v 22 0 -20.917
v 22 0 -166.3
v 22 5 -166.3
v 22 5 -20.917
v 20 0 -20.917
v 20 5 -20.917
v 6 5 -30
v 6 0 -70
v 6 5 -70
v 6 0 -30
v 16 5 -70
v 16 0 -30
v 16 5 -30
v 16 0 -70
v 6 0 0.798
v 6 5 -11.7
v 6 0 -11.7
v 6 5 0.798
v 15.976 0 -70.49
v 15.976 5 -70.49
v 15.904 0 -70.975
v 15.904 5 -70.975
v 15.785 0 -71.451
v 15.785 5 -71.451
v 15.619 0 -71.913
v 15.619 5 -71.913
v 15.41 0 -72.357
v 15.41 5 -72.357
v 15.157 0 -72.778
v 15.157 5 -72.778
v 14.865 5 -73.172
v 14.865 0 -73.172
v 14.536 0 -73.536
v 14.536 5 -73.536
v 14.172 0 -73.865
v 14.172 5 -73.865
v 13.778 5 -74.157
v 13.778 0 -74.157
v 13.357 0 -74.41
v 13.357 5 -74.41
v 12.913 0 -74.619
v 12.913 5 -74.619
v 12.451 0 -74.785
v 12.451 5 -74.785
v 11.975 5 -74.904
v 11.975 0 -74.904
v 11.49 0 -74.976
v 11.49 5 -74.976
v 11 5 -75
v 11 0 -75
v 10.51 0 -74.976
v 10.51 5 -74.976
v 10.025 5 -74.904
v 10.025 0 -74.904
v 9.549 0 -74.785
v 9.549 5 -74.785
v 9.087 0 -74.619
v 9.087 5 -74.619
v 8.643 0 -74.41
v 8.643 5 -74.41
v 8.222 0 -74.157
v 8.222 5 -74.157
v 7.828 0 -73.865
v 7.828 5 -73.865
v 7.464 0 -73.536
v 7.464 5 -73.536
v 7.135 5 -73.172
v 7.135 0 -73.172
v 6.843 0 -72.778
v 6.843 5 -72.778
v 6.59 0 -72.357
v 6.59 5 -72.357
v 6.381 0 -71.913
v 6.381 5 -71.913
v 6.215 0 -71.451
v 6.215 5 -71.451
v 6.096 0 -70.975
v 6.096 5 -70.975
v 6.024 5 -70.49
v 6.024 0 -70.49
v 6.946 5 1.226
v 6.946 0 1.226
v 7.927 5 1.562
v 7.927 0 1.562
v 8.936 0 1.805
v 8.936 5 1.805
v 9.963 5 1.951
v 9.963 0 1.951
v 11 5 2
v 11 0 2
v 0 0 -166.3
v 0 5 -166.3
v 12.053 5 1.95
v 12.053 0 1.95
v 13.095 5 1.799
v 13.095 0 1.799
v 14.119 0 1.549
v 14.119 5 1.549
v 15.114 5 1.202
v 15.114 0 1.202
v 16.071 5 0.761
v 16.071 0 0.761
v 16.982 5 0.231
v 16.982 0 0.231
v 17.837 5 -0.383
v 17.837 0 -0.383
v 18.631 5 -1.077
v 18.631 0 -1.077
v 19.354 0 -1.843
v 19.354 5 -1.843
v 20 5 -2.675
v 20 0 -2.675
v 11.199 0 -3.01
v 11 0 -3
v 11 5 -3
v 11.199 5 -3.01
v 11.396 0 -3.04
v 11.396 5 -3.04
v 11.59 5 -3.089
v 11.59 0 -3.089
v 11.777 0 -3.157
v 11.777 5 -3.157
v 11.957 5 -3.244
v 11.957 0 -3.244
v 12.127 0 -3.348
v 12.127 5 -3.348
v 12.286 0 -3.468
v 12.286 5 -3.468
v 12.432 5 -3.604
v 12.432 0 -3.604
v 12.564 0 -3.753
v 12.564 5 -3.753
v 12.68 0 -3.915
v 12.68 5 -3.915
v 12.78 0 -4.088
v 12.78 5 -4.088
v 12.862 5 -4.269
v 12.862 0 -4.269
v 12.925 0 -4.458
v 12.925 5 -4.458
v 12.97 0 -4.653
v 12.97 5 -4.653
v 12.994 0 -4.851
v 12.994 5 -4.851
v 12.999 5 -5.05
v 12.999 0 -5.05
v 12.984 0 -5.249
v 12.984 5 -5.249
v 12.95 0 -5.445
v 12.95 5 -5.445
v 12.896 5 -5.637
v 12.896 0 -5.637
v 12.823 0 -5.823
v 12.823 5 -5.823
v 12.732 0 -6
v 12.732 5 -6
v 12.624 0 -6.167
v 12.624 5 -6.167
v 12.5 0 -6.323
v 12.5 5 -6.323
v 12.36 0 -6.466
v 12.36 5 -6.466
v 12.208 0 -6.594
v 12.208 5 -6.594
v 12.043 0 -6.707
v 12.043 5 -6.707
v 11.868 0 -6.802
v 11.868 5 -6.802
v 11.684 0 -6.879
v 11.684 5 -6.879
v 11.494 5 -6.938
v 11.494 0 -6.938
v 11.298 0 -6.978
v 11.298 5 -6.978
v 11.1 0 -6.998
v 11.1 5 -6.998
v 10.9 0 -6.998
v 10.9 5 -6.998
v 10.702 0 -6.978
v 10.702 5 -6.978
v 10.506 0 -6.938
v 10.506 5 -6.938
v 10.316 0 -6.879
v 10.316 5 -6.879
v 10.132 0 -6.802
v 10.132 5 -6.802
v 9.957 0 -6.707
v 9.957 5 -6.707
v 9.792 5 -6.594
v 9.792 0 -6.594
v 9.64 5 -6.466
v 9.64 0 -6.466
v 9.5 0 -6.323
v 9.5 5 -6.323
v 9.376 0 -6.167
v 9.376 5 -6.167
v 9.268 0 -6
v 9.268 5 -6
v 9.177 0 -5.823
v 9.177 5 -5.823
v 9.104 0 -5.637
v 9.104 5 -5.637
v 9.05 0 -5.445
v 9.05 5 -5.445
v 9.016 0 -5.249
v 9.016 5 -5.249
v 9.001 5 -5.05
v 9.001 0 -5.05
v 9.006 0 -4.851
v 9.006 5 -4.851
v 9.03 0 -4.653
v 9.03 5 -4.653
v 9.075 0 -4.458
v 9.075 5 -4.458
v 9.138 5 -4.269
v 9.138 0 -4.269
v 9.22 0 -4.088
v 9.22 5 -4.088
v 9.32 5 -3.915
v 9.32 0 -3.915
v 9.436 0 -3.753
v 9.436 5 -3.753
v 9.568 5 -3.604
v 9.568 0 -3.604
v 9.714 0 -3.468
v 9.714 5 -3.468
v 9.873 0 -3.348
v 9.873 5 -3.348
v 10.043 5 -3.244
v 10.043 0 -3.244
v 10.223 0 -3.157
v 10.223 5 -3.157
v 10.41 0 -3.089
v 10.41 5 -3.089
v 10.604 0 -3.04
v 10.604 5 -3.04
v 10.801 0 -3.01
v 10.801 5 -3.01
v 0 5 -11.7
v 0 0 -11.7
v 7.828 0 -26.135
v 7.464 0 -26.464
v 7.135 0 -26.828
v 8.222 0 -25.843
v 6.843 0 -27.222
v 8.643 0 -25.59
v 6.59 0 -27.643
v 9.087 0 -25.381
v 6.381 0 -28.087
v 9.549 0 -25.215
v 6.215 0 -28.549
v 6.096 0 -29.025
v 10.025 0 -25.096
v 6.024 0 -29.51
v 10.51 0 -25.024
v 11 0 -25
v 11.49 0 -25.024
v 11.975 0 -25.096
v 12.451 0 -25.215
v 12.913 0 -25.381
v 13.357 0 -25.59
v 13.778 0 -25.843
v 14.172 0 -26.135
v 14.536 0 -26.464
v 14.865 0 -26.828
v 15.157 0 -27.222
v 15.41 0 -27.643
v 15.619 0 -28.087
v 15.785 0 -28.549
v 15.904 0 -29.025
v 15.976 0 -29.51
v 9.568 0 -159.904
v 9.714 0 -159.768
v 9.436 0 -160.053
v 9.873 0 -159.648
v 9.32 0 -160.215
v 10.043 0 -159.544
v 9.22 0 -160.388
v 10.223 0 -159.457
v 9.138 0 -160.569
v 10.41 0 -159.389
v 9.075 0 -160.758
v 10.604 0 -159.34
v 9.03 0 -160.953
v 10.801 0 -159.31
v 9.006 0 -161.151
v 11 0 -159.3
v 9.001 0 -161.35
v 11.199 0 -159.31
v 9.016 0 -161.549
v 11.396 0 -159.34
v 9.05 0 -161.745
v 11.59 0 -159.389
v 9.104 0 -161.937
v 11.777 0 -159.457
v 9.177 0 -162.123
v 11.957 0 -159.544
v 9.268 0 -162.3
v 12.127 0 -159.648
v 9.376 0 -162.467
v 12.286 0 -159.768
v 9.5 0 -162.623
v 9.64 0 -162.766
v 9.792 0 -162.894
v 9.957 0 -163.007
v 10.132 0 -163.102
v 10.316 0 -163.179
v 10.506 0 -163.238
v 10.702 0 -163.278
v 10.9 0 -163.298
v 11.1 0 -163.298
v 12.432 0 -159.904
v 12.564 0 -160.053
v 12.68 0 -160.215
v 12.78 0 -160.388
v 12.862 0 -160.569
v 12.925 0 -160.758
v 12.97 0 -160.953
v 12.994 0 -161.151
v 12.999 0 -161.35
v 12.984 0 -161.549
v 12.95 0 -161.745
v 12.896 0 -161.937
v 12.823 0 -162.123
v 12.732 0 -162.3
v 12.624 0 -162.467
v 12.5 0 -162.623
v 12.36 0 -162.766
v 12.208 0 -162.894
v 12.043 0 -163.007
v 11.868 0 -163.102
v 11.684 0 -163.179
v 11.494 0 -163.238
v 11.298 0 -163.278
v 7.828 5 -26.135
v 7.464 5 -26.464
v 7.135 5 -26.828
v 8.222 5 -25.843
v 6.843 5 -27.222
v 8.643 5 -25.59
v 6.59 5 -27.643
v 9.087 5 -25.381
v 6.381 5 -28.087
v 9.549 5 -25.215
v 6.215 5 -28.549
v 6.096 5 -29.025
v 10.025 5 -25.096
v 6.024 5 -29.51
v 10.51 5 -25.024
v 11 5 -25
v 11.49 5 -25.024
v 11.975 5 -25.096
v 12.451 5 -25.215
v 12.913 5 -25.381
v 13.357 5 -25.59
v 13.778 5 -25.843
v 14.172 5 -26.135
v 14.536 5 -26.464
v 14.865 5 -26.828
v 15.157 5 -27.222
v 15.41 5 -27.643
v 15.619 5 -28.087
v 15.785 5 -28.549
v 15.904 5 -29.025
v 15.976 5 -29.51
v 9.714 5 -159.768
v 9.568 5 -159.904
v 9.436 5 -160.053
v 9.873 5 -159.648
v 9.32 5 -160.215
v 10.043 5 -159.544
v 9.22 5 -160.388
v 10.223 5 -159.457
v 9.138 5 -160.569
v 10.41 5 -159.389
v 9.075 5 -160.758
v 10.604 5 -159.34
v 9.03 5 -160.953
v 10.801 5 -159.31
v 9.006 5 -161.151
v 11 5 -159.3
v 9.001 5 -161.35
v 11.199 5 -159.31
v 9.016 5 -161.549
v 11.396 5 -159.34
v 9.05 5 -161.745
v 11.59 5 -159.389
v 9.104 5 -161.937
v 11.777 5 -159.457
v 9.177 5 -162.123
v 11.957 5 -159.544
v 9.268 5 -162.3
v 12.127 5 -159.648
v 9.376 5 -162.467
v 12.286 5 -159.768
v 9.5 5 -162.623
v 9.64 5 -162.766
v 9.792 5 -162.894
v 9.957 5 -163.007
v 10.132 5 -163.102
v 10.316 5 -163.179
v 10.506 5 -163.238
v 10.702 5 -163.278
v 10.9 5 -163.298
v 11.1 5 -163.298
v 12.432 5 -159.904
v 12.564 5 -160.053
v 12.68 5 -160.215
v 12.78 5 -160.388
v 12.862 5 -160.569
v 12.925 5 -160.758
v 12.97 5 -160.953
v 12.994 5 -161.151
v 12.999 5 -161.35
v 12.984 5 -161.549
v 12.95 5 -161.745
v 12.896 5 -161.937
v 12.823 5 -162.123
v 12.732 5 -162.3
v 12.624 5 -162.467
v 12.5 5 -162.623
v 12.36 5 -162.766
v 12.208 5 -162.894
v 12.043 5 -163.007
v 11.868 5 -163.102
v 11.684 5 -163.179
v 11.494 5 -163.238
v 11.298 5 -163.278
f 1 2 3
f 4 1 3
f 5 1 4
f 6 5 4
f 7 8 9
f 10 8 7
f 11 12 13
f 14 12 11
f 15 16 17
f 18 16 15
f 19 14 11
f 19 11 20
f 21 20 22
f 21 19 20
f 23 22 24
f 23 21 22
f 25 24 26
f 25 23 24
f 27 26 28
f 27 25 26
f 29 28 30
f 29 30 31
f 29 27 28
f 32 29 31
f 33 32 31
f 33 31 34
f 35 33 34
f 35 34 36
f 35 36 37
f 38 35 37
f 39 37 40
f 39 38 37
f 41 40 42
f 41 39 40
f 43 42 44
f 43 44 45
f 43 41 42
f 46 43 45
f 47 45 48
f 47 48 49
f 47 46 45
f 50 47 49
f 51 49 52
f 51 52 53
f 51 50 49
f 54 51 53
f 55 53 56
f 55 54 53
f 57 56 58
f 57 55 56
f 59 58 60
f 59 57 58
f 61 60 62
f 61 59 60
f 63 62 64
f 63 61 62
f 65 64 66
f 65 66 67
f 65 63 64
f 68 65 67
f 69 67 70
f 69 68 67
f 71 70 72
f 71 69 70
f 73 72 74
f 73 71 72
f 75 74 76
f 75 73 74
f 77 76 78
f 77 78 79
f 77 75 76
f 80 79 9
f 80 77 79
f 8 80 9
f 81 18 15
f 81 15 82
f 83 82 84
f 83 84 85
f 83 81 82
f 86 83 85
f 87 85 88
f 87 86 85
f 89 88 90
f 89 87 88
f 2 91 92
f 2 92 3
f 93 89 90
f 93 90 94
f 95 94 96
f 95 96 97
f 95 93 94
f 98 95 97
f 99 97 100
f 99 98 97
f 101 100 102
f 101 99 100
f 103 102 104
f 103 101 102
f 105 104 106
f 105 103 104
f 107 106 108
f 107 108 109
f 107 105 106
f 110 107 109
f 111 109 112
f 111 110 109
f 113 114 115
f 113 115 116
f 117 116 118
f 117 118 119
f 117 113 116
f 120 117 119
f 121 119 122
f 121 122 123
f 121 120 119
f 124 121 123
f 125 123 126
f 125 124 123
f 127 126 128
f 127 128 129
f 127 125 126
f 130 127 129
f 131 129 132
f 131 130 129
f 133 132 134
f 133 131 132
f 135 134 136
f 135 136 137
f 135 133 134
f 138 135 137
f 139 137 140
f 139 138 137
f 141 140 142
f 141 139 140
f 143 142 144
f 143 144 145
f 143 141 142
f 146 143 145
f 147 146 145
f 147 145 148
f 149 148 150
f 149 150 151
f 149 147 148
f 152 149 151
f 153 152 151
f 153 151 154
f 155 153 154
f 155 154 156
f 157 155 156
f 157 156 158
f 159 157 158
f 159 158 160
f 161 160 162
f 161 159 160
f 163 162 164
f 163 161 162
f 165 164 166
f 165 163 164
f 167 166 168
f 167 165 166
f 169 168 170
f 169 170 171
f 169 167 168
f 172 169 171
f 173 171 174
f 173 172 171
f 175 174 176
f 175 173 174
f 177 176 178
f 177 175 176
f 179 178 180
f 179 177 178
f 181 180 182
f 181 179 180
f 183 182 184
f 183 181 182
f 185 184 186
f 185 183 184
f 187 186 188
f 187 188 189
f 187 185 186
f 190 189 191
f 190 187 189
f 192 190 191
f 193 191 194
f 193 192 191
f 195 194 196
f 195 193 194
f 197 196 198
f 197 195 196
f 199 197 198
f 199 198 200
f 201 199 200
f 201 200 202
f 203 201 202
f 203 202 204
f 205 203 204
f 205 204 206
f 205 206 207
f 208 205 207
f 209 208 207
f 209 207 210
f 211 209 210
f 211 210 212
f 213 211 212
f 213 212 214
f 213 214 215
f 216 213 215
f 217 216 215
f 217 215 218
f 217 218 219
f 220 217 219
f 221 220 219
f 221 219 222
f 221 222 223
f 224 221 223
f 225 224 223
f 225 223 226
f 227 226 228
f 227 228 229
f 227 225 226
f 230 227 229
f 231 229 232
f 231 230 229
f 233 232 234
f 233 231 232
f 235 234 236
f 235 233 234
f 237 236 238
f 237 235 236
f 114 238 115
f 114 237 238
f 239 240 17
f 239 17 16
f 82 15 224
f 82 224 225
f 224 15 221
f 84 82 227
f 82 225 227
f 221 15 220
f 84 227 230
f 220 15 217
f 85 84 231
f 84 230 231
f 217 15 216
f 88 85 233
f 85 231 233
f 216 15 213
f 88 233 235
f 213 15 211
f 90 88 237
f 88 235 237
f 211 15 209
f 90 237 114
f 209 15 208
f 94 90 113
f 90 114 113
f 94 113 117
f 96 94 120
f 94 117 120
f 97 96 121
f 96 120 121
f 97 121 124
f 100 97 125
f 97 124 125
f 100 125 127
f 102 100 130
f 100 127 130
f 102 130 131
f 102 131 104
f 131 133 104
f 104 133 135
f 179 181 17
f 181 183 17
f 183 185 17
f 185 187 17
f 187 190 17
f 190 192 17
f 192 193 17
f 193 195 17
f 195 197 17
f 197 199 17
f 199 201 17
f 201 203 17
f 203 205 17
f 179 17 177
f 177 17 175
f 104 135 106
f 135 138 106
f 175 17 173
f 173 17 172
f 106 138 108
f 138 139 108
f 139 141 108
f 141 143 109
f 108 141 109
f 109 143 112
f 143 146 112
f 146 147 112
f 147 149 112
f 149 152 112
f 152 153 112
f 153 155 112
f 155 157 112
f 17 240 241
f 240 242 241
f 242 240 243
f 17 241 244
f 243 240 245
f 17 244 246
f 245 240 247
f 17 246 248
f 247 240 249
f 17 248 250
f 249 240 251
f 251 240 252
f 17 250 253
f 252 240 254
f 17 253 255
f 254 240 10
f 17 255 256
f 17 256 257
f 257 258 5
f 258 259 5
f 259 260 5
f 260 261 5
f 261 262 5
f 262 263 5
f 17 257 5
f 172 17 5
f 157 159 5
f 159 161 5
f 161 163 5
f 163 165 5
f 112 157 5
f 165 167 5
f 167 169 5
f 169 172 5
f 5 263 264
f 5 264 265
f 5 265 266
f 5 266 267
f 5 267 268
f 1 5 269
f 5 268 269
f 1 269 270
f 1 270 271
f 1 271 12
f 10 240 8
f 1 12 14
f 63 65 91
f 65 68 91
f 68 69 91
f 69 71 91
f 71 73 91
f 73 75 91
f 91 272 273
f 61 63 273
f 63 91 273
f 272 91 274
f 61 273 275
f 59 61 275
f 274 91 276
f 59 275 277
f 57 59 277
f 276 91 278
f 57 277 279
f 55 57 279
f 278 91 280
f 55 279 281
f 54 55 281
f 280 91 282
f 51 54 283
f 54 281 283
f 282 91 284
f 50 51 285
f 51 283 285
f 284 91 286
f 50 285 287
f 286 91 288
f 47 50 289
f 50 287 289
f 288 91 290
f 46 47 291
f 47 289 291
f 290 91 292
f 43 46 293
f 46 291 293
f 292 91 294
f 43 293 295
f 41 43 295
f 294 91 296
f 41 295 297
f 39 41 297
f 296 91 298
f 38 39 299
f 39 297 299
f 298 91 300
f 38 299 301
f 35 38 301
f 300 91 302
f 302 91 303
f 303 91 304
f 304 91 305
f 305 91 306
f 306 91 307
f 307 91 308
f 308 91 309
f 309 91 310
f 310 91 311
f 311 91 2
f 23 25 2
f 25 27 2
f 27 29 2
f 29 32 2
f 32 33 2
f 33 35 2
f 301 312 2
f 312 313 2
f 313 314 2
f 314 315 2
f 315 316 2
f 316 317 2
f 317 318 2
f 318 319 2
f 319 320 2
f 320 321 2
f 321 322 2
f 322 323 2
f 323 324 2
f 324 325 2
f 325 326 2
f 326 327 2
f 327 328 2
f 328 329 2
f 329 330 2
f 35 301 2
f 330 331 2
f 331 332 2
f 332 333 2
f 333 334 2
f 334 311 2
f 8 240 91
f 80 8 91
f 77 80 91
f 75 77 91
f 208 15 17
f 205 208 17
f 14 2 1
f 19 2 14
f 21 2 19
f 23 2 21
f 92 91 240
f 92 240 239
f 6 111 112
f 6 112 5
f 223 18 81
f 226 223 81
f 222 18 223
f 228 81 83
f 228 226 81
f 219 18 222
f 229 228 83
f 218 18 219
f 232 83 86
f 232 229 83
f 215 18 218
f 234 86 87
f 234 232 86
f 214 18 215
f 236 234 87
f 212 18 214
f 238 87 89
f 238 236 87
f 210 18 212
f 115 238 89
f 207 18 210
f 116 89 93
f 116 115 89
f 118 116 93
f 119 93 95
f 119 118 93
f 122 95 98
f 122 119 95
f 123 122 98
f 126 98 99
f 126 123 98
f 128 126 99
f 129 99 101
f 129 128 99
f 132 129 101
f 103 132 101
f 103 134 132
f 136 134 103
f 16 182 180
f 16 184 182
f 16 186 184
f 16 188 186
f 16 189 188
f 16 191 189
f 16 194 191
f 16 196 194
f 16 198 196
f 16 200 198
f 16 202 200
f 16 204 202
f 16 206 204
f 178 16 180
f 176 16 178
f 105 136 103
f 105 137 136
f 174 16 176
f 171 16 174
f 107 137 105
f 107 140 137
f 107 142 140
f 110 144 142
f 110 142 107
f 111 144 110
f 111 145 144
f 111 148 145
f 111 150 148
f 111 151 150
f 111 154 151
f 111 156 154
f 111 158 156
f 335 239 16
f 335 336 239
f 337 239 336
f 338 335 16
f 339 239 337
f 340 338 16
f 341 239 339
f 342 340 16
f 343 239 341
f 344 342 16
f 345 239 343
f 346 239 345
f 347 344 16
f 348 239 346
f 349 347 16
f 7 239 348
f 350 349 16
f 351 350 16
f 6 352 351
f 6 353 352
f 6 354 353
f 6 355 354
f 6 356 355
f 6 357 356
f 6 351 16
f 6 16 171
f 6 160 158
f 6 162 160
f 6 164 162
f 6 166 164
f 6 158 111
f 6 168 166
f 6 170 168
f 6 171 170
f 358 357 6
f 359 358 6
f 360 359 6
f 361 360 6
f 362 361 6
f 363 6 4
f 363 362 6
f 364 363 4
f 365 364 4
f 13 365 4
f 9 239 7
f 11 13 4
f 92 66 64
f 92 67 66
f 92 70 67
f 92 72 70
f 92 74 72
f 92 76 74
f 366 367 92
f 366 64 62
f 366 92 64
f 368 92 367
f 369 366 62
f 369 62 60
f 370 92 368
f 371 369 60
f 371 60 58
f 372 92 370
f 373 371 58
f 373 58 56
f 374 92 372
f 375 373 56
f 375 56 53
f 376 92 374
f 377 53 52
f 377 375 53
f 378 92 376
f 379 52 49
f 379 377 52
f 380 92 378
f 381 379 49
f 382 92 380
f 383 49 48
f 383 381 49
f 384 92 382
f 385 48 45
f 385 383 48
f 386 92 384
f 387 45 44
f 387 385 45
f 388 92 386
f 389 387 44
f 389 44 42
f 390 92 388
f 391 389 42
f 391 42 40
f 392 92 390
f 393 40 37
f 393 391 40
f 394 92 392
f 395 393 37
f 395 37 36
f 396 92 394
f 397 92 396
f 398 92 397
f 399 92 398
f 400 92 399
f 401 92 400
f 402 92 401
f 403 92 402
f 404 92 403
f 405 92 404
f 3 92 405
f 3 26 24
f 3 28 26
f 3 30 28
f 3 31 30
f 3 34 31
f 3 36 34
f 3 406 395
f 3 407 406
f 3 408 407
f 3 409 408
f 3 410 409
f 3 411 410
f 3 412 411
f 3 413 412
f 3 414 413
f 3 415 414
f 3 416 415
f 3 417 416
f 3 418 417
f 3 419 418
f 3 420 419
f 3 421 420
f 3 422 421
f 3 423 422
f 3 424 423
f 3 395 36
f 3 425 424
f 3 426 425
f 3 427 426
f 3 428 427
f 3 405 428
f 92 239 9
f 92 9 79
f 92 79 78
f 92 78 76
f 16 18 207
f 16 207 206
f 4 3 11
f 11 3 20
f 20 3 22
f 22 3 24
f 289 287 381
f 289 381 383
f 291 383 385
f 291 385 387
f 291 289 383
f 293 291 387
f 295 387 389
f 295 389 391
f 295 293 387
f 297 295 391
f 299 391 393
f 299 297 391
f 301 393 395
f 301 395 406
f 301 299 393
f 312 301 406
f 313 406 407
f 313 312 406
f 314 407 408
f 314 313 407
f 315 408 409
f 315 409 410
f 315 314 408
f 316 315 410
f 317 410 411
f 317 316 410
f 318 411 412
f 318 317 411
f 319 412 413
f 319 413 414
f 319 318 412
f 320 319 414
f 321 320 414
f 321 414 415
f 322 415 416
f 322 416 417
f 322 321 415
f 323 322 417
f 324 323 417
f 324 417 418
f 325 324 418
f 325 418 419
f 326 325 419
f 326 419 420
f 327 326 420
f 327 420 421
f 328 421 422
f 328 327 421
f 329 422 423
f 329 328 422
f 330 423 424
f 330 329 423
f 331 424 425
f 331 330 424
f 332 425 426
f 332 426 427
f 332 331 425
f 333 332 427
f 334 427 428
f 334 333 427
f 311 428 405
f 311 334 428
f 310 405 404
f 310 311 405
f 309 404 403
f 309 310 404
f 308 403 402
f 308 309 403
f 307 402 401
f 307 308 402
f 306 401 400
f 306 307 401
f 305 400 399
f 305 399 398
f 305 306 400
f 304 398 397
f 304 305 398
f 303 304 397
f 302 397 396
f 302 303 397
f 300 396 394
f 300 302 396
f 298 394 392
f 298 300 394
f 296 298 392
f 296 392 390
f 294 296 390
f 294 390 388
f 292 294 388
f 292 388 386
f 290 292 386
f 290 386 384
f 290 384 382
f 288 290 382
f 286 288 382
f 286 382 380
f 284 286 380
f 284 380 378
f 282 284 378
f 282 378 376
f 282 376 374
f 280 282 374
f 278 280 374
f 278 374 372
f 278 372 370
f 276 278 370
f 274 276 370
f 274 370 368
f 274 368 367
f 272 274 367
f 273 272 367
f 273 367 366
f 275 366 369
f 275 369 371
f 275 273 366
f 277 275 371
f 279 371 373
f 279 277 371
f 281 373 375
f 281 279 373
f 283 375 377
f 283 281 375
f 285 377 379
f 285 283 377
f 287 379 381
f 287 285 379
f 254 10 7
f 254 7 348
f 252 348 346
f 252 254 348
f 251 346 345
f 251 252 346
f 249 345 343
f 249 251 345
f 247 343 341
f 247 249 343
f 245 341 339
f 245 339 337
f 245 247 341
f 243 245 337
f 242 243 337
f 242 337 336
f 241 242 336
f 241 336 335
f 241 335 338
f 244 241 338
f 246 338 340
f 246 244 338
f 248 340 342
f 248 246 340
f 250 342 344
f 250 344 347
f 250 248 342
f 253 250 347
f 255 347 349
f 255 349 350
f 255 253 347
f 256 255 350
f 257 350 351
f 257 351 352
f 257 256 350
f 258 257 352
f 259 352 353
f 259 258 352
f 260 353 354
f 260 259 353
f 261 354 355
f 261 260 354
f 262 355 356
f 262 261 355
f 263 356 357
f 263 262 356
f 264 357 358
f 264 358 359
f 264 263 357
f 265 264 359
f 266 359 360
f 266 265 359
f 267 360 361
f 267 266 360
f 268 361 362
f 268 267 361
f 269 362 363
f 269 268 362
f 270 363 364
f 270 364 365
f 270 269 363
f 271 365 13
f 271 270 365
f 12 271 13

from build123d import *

# Parameters (mm, degrees)
SKETCH1_W           = 22
SKETCH1_H           = 166.3
SKETCH1_R           = 2
BOSS_EXTRUDE1_DEPTH = 5
CUT_EXTRUDE1_DEPTH  = 5
SKETCH3_W           = 22
SKETCH3_H           = 5
BOSS_EXTRUDE2_DEPTH = 6
SKETCH4_W           = 22
SKETCH4_H           = 5
CUT_EXTRUDE2_DEPTH  = 4
FILLET2_R           = 11
SKETCH5_W           = 19.280438378
SKETCH5_H           = 5
CUT_EXTRUDE3_DEPTH  = 6
SKETCH7_W           = 29.371075178
SKETCH7_H           = 5
CUT_EXTRUDE4_DEPTH  = 2


with BuildPart() as part:
    # Sketch1 → Boss-Extrude1 (new body)
    with BuildSketch(Plane(origin=(0, 0, 0), x_dir=(1, 0, 0), z_dir=(0, 1, 0))):
        with Locations((11, 83.15)):
            Rectangle(SKETCH1_W, SKETCH1_H)
        with Locations(Location((11, 5, 0), (0, 0, 270))):
            Circle(SKETCH1_R, mode=Mode.SUBTRACT)
        with Locations(Location((11, 161.3, 0), (0, 0, 270))):
            Circle(SKETCH1_R, mode=Mode.SUBTRACT)
    extrude(amount=BOSS_EXTRUDE1_DEPTH)

    # Sketch2 → Cut-Extrude1 (cut)
    with BuildSketch(Plane(origin=(0, 0, 0), x_dir=(-1, 0, 0), z_dir=(0, -1, 0))):
        with BuildLine():
            Line((-16, 30), (-16, 70))
            ThreePointArc((-16, 70), (-11, 75), (-6, 70))
            Line((-6, 70), (-6, 30))
            ThreePointArc((-6, 30), (-11, 25), (-16, 30))
        make_face()
    extrude(amount=-CUT_EXTRUDE1_DEPTH, mode=Mode.SUBTRACT)

    # Sketch3 → Boss-Extrude2 (add)
    with BuildSketch(Plane.XY):
        with Locations((11, 2.5)):
            Rectangle(SKETCH3_W, SKETCH3_H)
    extrude(amount=BOSS_EXTRUDE2_DEPTH)

    # Sketch4 → Cut-Extrude2 (cut)
    with BuildSketch(Plane.XY.offset(6)):
        with Locations((11, 2.5)):
            Rectangle(SKETCH4_W, SKETCH4_H)
    extrude(amount=-CUT_EXTRUDE2_DEPTH, mode=Mode.SUBTRACT)

    # Fillet2
    fillet2_edges = [part.edges().sort_by_distance(p)[0] for p in [
        (0, 2.5, 2),
        (22, 2.5, 2),
    ]]
    fillet(fillet2_edges, radius=FILLET2_R - 0.0001)  # a hair under: the kernel refuses the full size

    # Sketch5 → Cut-Extrude3 (cut)
    with BuildSketch(Plane.ZY):
        with Locations((-2.059665651, 2.5)):
            Rectangle(SKETCH5_W, SKETCH5_H)
    extrude(amount=-CUT_EXTRUDE3_DEPTH, mode=Mode.SUBTRACT)

    # Sketch7 → Cut-Extrude4 (cut)
    with BuildSketch(Plane(origin=(22, 0, 0), x_dir=(0, 0, -1), z_dir=(1, 0, 0))):
        with Locations((6.231522195, 2.5)):
            Rectangle(SKETCH7_W, SKETCH7_H)
    extrude(amount=-CUT_EXTRUDE4_DEPTH, mode=Mode.SUBTRACT)


solid = part.part
